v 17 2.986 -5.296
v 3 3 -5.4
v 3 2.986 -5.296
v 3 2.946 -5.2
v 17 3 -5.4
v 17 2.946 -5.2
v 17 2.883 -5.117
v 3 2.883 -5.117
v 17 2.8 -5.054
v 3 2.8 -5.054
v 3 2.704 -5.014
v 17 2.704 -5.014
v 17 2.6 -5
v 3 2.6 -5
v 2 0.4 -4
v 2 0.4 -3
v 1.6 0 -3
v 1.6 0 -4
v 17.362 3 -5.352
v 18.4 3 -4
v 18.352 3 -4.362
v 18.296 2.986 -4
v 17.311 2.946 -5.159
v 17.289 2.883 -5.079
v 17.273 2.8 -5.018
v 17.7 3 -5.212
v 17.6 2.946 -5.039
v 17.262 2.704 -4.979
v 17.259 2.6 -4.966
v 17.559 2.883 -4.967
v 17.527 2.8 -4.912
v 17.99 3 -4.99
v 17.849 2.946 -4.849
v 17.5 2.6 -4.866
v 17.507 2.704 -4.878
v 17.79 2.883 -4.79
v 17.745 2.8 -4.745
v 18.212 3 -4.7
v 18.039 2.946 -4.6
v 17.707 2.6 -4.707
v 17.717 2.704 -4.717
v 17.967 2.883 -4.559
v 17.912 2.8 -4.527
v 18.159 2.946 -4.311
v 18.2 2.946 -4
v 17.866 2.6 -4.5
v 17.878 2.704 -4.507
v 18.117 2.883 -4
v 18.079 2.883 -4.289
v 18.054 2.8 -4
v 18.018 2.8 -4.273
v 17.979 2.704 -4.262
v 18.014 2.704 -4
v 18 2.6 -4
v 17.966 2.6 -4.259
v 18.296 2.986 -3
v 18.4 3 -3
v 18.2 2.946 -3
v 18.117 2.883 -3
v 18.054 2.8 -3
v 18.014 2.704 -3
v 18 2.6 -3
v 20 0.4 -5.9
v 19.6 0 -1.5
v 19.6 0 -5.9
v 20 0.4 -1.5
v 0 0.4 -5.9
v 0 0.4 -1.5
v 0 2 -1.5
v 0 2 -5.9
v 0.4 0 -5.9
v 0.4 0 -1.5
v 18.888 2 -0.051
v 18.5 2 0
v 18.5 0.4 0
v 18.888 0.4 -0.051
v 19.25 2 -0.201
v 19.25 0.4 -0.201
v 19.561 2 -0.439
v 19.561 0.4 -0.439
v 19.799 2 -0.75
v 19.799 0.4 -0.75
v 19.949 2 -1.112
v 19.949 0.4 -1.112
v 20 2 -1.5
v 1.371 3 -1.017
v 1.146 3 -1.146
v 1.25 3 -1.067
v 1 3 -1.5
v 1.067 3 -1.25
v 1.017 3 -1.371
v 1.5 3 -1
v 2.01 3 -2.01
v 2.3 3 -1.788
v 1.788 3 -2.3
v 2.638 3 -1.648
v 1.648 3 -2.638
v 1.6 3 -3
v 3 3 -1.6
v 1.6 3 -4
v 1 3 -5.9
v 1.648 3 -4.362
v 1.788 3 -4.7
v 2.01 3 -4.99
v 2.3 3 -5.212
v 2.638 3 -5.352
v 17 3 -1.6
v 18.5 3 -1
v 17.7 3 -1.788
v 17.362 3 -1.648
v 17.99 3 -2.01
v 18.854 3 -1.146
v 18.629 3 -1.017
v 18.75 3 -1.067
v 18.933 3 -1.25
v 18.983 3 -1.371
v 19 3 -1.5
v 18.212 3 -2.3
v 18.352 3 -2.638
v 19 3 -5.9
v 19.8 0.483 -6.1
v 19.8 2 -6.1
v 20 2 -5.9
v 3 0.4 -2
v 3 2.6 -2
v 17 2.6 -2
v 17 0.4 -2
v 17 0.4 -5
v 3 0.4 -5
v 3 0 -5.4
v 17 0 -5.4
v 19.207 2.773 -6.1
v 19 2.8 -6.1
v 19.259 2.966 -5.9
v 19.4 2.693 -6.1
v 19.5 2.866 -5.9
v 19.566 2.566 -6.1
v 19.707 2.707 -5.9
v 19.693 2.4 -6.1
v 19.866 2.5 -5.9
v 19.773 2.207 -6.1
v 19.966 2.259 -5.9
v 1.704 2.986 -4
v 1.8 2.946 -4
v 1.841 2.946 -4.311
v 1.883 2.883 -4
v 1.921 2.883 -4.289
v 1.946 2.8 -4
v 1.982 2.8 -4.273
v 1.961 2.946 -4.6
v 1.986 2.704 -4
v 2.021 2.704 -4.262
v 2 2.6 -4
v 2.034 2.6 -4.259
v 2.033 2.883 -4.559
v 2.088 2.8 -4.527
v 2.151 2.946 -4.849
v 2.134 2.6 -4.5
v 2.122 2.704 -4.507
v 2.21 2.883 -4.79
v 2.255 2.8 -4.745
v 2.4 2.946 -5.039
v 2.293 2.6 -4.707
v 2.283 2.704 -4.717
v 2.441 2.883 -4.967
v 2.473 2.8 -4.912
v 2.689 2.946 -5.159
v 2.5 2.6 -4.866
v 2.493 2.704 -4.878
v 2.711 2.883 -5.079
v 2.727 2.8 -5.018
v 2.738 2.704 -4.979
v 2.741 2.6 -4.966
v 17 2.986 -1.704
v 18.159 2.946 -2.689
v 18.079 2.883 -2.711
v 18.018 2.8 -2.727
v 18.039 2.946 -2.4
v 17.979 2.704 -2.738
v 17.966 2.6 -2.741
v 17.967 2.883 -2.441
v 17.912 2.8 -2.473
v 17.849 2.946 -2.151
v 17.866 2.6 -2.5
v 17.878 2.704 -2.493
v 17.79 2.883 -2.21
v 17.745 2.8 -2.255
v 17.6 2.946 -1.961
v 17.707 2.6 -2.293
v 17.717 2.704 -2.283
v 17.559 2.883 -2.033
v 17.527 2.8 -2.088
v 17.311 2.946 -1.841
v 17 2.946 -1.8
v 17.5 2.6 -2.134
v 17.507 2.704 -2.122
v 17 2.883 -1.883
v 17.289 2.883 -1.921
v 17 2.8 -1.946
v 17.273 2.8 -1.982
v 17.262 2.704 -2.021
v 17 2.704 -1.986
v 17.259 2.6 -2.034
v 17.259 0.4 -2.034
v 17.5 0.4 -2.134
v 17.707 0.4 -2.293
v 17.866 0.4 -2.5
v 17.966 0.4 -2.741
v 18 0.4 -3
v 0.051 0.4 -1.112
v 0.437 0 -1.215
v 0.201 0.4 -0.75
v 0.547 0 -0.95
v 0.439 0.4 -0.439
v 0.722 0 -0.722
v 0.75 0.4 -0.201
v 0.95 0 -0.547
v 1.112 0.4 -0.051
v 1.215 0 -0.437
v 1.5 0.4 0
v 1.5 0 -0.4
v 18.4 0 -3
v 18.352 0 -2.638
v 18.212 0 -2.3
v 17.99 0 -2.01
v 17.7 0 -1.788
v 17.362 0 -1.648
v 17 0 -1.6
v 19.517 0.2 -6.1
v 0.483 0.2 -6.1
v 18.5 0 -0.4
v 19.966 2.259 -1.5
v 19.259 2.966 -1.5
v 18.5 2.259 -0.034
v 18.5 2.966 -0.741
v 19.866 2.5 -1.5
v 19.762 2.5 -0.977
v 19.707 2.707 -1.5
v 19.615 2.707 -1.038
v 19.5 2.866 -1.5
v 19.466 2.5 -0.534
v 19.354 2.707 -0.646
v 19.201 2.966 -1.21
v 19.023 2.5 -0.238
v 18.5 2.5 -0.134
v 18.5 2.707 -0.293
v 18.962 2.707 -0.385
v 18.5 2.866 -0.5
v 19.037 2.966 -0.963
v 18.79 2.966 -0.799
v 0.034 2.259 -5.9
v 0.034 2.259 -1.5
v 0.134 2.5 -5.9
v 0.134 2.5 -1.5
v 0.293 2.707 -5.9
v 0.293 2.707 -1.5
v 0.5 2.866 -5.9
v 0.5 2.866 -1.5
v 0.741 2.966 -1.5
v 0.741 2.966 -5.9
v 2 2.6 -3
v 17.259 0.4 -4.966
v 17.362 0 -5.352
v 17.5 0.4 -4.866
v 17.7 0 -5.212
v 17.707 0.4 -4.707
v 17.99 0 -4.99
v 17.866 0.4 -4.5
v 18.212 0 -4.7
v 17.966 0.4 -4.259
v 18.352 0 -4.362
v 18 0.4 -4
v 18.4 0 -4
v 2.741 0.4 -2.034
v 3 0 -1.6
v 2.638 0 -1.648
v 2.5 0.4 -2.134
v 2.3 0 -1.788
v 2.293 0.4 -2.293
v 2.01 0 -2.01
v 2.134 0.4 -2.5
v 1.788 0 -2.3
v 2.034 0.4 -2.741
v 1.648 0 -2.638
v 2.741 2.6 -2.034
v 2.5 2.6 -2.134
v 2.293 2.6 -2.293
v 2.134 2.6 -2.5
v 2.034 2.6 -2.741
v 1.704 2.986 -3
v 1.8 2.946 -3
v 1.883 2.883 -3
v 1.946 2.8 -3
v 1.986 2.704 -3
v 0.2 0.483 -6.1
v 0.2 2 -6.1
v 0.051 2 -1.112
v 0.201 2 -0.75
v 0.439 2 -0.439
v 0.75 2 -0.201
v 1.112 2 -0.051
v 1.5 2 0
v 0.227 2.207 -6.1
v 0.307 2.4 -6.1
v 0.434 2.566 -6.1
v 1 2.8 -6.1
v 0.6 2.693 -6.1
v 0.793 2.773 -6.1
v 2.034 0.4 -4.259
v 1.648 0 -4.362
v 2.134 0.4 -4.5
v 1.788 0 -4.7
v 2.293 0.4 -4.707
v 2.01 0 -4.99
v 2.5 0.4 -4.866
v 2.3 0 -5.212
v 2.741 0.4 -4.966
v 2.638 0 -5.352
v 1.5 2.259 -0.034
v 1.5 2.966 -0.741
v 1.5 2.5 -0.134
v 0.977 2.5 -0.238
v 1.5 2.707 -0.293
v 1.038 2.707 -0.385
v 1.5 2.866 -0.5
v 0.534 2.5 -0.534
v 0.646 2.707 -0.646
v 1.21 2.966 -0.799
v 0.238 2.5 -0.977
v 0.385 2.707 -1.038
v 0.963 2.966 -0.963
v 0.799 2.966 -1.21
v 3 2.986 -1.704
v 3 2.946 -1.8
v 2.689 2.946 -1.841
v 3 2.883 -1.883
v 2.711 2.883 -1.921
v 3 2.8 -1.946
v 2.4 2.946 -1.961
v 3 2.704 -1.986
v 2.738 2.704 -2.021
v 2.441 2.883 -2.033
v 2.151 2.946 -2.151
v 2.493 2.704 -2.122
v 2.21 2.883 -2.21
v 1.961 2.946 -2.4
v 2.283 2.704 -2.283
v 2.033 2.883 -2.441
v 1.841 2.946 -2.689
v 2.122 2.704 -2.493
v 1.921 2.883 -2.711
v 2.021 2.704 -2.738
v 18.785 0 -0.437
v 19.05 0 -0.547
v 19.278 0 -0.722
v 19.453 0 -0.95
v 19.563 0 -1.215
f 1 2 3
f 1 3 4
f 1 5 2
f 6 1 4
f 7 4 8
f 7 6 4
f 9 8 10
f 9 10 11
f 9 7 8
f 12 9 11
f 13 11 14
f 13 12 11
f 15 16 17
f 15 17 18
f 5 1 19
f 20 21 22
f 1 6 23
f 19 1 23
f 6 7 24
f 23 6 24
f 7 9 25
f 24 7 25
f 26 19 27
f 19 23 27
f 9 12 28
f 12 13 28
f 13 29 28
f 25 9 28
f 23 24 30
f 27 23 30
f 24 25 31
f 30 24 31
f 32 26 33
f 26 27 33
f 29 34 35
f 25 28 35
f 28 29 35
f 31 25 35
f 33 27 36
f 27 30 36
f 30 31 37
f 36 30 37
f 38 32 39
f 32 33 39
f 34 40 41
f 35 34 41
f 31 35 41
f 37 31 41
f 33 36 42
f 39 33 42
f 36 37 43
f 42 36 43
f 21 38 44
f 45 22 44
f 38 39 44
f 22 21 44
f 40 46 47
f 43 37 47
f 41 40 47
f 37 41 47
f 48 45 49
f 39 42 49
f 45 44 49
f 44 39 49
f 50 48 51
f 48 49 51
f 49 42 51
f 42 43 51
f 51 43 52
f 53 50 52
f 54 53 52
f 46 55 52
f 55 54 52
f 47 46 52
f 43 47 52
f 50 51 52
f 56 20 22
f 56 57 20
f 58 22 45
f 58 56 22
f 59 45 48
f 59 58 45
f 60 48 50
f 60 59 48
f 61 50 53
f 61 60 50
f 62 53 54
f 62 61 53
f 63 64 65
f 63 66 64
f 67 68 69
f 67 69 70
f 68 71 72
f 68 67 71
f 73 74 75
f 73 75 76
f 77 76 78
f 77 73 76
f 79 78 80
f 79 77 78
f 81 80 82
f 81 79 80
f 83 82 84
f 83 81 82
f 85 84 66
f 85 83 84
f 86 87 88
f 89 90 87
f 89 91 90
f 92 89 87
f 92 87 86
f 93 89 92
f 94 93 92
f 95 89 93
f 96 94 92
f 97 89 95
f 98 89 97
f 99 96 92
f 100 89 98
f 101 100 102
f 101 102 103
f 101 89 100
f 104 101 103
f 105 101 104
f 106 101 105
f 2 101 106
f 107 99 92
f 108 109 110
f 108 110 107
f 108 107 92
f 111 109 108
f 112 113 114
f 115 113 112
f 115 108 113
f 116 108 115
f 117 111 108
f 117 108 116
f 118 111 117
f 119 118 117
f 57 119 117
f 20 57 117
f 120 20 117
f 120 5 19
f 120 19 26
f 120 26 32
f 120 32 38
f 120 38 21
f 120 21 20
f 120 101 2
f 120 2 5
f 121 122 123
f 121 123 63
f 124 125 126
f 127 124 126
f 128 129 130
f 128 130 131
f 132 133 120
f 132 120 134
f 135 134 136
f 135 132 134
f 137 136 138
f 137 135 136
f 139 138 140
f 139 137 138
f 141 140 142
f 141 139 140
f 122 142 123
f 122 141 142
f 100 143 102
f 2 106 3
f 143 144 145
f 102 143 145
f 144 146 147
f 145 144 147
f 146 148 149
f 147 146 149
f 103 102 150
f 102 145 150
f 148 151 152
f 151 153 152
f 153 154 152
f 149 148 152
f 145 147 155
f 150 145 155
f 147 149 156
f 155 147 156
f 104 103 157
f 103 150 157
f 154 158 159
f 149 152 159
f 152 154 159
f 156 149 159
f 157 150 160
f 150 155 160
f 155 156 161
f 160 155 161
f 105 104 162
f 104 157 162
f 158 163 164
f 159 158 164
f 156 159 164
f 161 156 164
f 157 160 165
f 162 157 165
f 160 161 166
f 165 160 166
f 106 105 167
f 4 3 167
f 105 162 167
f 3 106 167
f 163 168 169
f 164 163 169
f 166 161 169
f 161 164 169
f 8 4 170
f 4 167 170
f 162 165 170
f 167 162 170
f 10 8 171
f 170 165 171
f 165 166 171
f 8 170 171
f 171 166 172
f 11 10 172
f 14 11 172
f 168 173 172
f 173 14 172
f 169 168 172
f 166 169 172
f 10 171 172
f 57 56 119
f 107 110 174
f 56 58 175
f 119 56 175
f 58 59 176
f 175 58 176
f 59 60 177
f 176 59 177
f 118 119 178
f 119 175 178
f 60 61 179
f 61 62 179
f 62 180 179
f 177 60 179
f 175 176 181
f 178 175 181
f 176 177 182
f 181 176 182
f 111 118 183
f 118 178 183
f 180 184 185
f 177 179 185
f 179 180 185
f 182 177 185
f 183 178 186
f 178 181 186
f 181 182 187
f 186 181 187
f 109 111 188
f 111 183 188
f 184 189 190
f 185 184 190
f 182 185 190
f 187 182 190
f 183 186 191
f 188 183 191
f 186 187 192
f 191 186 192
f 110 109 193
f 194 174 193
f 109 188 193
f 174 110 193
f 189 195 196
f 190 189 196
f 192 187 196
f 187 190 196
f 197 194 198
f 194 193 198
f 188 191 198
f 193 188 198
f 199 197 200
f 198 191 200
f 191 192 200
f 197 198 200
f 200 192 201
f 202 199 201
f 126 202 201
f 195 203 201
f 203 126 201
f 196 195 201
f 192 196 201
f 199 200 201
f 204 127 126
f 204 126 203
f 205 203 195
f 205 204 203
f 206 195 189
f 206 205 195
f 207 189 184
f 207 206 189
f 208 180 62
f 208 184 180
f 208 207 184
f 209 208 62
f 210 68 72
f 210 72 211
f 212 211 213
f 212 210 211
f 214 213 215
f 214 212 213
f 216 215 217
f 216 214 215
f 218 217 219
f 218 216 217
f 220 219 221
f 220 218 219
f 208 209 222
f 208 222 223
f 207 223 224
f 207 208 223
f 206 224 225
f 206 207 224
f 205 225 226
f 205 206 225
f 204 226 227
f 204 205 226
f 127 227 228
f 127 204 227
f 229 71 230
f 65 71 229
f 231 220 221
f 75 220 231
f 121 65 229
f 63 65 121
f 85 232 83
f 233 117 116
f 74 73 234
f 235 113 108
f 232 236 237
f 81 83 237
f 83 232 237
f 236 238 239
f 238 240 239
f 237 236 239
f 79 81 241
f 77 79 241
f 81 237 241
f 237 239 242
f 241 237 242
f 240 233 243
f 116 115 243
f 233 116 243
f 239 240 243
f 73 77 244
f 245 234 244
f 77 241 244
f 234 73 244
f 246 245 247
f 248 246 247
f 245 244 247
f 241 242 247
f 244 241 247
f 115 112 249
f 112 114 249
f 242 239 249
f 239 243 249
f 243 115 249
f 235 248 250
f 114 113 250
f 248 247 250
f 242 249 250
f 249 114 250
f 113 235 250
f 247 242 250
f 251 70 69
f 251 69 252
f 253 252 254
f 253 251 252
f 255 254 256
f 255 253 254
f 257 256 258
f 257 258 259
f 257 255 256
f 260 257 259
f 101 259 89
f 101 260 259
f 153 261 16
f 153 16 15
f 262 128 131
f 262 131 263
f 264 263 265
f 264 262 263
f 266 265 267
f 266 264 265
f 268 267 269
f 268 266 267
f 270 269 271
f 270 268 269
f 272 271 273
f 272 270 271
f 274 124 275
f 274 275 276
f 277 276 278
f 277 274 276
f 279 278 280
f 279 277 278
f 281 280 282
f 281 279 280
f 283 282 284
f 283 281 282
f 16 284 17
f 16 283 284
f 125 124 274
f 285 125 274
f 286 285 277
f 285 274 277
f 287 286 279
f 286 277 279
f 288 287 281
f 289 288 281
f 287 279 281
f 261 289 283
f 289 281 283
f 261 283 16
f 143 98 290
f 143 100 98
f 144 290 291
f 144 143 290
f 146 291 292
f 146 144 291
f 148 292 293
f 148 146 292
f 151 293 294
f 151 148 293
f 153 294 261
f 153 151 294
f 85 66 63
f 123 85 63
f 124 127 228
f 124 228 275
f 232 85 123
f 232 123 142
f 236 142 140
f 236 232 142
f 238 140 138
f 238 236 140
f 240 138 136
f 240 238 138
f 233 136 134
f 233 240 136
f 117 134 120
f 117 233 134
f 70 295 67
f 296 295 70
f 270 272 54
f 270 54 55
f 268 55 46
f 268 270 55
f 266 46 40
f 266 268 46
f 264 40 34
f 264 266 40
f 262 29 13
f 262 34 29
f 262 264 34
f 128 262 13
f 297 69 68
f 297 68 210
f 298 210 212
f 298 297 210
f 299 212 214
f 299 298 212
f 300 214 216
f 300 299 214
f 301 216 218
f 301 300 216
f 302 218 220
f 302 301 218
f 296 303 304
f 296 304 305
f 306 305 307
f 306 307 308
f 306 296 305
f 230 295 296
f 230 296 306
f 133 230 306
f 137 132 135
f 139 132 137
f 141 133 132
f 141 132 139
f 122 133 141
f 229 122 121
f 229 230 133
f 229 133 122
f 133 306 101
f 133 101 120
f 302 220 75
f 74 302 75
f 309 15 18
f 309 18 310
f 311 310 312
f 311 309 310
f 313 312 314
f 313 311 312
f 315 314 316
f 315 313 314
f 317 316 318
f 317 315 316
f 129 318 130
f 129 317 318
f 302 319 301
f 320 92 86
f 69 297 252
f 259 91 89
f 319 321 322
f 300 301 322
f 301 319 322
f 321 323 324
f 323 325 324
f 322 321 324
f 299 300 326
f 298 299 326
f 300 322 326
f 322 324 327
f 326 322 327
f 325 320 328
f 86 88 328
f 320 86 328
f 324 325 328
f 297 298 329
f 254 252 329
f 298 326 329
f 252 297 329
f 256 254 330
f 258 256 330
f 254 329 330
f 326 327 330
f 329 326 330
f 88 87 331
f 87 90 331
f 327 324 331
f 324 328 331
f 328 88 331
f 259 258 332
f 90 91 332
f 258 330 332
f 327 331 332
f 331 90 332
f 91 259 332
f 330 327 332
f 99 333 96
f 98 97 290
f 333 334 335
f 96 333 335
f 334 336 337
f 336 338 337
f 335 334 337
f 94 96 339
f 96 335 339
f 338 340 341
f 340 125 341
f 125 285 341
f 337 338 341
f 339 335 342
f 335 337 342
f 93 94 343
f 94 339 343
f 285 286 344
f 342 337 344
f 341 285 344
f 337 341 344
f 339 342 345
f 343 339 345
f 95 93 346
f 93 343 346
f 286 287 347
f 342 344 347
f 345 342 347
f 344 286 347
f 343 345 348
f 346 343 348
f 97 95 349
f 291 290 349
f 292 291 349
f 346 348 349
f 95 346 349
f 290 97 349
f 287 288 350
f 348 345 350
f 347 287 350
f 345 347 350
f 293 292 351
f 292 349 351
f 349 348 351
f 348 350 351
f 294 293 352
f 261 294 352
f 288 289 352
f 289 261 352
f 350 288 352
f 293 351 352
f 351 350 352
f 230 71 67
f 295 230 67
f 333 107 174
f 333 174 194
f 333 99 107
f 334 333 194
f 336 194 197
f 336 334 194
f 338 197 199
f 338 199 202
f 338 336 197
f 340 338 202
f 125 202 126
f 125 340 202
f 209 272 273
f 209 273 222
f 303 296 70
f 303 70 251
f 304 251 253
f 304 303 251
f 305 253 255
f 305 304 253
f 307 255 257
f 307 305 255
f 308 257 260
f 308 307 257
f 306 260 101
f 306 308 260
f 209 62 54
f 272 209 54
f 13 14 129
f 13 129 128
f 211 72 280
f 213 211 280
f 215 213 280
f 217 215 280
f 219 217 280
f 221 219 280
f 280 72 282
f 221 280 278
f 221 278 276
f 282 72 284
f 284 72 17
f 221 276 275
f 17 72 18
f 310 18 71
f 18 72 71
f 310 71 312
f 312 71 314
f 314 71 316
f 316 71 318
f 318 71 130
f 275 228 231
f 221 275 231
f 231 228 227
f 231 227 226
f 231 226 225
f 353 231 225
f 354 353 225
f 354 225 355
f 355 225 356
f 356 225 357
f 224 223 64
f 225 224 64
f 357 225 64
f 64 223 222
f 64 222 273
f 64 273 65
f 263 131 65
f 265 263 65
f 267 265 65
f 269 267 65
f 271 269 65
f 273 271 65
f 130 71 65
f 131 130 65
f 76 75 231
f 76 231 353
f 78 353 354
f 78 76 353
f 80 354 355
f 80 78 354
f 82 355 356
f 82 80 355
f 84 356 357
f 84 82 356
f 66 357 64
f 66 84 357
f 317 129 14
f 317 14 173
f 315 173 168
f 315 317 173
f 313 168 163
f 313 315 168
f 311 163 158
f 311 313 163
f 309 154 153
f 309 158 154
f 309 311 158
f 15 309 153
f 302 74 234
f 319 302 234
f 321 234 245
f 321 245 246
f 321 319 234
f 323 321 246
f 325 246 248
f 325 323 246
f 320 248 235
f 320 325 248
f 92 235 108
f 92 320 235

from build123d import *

# Parameters (mm, degrees)
SKETCH_1_W          = 20
SKETCH_1_H          = 6.1
EXTRUDE_1_DEPTH     = 3
SKETCH_2_W          = 16
SKETCH_2_H          = 3
CUT_EXTRUDE_1_DEPTH = 3
FILLET_1_R          = 1
FILLET_2_R          = 1.5
FILLET_3_R          = 1
CHAMFER_1_SIZE      = 0.4
FILLET_4_R          = 0.4
CHAMFER_2_SIZE      = 0.2


with BuildPart() as part:
    # 草图1 → 凸台-拉伸1 (new body)
    with BuildSketch(Plane(origin=(0, 0, 0), x_dir=(1, 0, 0), z_dir=(0, 1, 0))):
        with Locations((10, 3.05)):
            Rectangle(SKETCH_1_W, SKETCH_1_H)
    extrude(amount=EXTRUDE_1_DEPTH)

    # 草图2 → 切除-拉伸1 (cut)
    with BuildSketch(Plane(origin=(0, 3, 0), x_dir=(1, 0, 0), z_dir=(0, 1, 0))):
        with Locations((10, 3.5)):
            Rectangle(SKETCH_2_W, SKETCH_2_H)
    extrude(amount=-CUT_EXTRUDE_1_DEPTH, mode=Mode.SUBTRACT)

    # 圆角1
    fillet_1_edges = [part.edges().sort_by_distance(p)[0] for p in [
        (2, 1.5, -2),
        (2, 1.5, -5),
        (18, 1.5, -5),
        (18, 1.5, -2),
    ]]
    fillet(fillet_1_edges, radius=FILLET_1_R)

    # 圆角2
    fillet_2_edges = [part.edges().sort_by_distance(p)[0] for p in [
        (20, 1.5, 0),
        (0, 1.5, 0),
    ]]
    fillet(fillet_2_edges, radius=FILLET_2_R)

    # 圆角3
    fillet_3_edges = [part.edges().sort_by_distance(p)[0] for p in [
        (0, 3, -3.8),
        (10, 3, 0),
        (20, 3, -3.8),
        (19.560660172, 3, -0.439339828),
        (0.439339828, 3, -0.439339828),
    ]]
    fillet(fillet_3_edges, radius=FILLET_3_R)

    # 倒角1
    chamfer_1_edges = [part.edges().sort_by_distance(p)[0] for p in [
        (2, 0, -3.5),
        (10, 0, -5),
        (18, 0, -3.5),
        (10, 0, -2),
        (2.292893219, 0, -4.707106781),
        (17.707106781, 0, -4.707106781),
        (17.707106781, 0, -2.292893219),
        (2.292893219, 0, -2.292893219),
        (10, 0, 0),
        (20, 0, -3.8),
        (19.560660172, 0, -0.439339828),
        (0.439339828, 0, -0.439339828),
        (0, 0, -3.8),
    ]]
    chamfer(chamfer_1_edges, length=CHAMFER_1_SIZE)

    # 圆角4
    fillet_4_edges = [part.edges().sort_by_distance(p)[0] for p in [
        (2, 3, -3.5),
        (10, 3, -5),
        (18, 3, -3.5),
        (10, 3, -2),
        (2.292893219, 3, -4.707106781),
        (17.707106781, 3, -4.707106781),
        (17.707106781, 3, -2.292893219),
        (2.292893219, 3, -2.292893219),
    ]]
    fillet(fillet_4_edges, radius=FILLET_4_R)

    # 倒角2
    chamfer_2_edges = [part.edges().sort_by_distance(p)[0] for p in [
        (19.8, 0.2, -6.1),
        (0.2, 0.2, -6.1),
        (10, 3, -6.1),
        (0, 1.2, -6.1),
        (20, 1.2, -6.1),
        (19.707106781, 2.707106781, -6.1),
        (0.292893219, 2.707106781, -6.1),
        (10, 0, -6.1),
    ]]
    chamfer(chamfer_2_edges, length=CHAMFER_2_SIZE)


solid = part.part
